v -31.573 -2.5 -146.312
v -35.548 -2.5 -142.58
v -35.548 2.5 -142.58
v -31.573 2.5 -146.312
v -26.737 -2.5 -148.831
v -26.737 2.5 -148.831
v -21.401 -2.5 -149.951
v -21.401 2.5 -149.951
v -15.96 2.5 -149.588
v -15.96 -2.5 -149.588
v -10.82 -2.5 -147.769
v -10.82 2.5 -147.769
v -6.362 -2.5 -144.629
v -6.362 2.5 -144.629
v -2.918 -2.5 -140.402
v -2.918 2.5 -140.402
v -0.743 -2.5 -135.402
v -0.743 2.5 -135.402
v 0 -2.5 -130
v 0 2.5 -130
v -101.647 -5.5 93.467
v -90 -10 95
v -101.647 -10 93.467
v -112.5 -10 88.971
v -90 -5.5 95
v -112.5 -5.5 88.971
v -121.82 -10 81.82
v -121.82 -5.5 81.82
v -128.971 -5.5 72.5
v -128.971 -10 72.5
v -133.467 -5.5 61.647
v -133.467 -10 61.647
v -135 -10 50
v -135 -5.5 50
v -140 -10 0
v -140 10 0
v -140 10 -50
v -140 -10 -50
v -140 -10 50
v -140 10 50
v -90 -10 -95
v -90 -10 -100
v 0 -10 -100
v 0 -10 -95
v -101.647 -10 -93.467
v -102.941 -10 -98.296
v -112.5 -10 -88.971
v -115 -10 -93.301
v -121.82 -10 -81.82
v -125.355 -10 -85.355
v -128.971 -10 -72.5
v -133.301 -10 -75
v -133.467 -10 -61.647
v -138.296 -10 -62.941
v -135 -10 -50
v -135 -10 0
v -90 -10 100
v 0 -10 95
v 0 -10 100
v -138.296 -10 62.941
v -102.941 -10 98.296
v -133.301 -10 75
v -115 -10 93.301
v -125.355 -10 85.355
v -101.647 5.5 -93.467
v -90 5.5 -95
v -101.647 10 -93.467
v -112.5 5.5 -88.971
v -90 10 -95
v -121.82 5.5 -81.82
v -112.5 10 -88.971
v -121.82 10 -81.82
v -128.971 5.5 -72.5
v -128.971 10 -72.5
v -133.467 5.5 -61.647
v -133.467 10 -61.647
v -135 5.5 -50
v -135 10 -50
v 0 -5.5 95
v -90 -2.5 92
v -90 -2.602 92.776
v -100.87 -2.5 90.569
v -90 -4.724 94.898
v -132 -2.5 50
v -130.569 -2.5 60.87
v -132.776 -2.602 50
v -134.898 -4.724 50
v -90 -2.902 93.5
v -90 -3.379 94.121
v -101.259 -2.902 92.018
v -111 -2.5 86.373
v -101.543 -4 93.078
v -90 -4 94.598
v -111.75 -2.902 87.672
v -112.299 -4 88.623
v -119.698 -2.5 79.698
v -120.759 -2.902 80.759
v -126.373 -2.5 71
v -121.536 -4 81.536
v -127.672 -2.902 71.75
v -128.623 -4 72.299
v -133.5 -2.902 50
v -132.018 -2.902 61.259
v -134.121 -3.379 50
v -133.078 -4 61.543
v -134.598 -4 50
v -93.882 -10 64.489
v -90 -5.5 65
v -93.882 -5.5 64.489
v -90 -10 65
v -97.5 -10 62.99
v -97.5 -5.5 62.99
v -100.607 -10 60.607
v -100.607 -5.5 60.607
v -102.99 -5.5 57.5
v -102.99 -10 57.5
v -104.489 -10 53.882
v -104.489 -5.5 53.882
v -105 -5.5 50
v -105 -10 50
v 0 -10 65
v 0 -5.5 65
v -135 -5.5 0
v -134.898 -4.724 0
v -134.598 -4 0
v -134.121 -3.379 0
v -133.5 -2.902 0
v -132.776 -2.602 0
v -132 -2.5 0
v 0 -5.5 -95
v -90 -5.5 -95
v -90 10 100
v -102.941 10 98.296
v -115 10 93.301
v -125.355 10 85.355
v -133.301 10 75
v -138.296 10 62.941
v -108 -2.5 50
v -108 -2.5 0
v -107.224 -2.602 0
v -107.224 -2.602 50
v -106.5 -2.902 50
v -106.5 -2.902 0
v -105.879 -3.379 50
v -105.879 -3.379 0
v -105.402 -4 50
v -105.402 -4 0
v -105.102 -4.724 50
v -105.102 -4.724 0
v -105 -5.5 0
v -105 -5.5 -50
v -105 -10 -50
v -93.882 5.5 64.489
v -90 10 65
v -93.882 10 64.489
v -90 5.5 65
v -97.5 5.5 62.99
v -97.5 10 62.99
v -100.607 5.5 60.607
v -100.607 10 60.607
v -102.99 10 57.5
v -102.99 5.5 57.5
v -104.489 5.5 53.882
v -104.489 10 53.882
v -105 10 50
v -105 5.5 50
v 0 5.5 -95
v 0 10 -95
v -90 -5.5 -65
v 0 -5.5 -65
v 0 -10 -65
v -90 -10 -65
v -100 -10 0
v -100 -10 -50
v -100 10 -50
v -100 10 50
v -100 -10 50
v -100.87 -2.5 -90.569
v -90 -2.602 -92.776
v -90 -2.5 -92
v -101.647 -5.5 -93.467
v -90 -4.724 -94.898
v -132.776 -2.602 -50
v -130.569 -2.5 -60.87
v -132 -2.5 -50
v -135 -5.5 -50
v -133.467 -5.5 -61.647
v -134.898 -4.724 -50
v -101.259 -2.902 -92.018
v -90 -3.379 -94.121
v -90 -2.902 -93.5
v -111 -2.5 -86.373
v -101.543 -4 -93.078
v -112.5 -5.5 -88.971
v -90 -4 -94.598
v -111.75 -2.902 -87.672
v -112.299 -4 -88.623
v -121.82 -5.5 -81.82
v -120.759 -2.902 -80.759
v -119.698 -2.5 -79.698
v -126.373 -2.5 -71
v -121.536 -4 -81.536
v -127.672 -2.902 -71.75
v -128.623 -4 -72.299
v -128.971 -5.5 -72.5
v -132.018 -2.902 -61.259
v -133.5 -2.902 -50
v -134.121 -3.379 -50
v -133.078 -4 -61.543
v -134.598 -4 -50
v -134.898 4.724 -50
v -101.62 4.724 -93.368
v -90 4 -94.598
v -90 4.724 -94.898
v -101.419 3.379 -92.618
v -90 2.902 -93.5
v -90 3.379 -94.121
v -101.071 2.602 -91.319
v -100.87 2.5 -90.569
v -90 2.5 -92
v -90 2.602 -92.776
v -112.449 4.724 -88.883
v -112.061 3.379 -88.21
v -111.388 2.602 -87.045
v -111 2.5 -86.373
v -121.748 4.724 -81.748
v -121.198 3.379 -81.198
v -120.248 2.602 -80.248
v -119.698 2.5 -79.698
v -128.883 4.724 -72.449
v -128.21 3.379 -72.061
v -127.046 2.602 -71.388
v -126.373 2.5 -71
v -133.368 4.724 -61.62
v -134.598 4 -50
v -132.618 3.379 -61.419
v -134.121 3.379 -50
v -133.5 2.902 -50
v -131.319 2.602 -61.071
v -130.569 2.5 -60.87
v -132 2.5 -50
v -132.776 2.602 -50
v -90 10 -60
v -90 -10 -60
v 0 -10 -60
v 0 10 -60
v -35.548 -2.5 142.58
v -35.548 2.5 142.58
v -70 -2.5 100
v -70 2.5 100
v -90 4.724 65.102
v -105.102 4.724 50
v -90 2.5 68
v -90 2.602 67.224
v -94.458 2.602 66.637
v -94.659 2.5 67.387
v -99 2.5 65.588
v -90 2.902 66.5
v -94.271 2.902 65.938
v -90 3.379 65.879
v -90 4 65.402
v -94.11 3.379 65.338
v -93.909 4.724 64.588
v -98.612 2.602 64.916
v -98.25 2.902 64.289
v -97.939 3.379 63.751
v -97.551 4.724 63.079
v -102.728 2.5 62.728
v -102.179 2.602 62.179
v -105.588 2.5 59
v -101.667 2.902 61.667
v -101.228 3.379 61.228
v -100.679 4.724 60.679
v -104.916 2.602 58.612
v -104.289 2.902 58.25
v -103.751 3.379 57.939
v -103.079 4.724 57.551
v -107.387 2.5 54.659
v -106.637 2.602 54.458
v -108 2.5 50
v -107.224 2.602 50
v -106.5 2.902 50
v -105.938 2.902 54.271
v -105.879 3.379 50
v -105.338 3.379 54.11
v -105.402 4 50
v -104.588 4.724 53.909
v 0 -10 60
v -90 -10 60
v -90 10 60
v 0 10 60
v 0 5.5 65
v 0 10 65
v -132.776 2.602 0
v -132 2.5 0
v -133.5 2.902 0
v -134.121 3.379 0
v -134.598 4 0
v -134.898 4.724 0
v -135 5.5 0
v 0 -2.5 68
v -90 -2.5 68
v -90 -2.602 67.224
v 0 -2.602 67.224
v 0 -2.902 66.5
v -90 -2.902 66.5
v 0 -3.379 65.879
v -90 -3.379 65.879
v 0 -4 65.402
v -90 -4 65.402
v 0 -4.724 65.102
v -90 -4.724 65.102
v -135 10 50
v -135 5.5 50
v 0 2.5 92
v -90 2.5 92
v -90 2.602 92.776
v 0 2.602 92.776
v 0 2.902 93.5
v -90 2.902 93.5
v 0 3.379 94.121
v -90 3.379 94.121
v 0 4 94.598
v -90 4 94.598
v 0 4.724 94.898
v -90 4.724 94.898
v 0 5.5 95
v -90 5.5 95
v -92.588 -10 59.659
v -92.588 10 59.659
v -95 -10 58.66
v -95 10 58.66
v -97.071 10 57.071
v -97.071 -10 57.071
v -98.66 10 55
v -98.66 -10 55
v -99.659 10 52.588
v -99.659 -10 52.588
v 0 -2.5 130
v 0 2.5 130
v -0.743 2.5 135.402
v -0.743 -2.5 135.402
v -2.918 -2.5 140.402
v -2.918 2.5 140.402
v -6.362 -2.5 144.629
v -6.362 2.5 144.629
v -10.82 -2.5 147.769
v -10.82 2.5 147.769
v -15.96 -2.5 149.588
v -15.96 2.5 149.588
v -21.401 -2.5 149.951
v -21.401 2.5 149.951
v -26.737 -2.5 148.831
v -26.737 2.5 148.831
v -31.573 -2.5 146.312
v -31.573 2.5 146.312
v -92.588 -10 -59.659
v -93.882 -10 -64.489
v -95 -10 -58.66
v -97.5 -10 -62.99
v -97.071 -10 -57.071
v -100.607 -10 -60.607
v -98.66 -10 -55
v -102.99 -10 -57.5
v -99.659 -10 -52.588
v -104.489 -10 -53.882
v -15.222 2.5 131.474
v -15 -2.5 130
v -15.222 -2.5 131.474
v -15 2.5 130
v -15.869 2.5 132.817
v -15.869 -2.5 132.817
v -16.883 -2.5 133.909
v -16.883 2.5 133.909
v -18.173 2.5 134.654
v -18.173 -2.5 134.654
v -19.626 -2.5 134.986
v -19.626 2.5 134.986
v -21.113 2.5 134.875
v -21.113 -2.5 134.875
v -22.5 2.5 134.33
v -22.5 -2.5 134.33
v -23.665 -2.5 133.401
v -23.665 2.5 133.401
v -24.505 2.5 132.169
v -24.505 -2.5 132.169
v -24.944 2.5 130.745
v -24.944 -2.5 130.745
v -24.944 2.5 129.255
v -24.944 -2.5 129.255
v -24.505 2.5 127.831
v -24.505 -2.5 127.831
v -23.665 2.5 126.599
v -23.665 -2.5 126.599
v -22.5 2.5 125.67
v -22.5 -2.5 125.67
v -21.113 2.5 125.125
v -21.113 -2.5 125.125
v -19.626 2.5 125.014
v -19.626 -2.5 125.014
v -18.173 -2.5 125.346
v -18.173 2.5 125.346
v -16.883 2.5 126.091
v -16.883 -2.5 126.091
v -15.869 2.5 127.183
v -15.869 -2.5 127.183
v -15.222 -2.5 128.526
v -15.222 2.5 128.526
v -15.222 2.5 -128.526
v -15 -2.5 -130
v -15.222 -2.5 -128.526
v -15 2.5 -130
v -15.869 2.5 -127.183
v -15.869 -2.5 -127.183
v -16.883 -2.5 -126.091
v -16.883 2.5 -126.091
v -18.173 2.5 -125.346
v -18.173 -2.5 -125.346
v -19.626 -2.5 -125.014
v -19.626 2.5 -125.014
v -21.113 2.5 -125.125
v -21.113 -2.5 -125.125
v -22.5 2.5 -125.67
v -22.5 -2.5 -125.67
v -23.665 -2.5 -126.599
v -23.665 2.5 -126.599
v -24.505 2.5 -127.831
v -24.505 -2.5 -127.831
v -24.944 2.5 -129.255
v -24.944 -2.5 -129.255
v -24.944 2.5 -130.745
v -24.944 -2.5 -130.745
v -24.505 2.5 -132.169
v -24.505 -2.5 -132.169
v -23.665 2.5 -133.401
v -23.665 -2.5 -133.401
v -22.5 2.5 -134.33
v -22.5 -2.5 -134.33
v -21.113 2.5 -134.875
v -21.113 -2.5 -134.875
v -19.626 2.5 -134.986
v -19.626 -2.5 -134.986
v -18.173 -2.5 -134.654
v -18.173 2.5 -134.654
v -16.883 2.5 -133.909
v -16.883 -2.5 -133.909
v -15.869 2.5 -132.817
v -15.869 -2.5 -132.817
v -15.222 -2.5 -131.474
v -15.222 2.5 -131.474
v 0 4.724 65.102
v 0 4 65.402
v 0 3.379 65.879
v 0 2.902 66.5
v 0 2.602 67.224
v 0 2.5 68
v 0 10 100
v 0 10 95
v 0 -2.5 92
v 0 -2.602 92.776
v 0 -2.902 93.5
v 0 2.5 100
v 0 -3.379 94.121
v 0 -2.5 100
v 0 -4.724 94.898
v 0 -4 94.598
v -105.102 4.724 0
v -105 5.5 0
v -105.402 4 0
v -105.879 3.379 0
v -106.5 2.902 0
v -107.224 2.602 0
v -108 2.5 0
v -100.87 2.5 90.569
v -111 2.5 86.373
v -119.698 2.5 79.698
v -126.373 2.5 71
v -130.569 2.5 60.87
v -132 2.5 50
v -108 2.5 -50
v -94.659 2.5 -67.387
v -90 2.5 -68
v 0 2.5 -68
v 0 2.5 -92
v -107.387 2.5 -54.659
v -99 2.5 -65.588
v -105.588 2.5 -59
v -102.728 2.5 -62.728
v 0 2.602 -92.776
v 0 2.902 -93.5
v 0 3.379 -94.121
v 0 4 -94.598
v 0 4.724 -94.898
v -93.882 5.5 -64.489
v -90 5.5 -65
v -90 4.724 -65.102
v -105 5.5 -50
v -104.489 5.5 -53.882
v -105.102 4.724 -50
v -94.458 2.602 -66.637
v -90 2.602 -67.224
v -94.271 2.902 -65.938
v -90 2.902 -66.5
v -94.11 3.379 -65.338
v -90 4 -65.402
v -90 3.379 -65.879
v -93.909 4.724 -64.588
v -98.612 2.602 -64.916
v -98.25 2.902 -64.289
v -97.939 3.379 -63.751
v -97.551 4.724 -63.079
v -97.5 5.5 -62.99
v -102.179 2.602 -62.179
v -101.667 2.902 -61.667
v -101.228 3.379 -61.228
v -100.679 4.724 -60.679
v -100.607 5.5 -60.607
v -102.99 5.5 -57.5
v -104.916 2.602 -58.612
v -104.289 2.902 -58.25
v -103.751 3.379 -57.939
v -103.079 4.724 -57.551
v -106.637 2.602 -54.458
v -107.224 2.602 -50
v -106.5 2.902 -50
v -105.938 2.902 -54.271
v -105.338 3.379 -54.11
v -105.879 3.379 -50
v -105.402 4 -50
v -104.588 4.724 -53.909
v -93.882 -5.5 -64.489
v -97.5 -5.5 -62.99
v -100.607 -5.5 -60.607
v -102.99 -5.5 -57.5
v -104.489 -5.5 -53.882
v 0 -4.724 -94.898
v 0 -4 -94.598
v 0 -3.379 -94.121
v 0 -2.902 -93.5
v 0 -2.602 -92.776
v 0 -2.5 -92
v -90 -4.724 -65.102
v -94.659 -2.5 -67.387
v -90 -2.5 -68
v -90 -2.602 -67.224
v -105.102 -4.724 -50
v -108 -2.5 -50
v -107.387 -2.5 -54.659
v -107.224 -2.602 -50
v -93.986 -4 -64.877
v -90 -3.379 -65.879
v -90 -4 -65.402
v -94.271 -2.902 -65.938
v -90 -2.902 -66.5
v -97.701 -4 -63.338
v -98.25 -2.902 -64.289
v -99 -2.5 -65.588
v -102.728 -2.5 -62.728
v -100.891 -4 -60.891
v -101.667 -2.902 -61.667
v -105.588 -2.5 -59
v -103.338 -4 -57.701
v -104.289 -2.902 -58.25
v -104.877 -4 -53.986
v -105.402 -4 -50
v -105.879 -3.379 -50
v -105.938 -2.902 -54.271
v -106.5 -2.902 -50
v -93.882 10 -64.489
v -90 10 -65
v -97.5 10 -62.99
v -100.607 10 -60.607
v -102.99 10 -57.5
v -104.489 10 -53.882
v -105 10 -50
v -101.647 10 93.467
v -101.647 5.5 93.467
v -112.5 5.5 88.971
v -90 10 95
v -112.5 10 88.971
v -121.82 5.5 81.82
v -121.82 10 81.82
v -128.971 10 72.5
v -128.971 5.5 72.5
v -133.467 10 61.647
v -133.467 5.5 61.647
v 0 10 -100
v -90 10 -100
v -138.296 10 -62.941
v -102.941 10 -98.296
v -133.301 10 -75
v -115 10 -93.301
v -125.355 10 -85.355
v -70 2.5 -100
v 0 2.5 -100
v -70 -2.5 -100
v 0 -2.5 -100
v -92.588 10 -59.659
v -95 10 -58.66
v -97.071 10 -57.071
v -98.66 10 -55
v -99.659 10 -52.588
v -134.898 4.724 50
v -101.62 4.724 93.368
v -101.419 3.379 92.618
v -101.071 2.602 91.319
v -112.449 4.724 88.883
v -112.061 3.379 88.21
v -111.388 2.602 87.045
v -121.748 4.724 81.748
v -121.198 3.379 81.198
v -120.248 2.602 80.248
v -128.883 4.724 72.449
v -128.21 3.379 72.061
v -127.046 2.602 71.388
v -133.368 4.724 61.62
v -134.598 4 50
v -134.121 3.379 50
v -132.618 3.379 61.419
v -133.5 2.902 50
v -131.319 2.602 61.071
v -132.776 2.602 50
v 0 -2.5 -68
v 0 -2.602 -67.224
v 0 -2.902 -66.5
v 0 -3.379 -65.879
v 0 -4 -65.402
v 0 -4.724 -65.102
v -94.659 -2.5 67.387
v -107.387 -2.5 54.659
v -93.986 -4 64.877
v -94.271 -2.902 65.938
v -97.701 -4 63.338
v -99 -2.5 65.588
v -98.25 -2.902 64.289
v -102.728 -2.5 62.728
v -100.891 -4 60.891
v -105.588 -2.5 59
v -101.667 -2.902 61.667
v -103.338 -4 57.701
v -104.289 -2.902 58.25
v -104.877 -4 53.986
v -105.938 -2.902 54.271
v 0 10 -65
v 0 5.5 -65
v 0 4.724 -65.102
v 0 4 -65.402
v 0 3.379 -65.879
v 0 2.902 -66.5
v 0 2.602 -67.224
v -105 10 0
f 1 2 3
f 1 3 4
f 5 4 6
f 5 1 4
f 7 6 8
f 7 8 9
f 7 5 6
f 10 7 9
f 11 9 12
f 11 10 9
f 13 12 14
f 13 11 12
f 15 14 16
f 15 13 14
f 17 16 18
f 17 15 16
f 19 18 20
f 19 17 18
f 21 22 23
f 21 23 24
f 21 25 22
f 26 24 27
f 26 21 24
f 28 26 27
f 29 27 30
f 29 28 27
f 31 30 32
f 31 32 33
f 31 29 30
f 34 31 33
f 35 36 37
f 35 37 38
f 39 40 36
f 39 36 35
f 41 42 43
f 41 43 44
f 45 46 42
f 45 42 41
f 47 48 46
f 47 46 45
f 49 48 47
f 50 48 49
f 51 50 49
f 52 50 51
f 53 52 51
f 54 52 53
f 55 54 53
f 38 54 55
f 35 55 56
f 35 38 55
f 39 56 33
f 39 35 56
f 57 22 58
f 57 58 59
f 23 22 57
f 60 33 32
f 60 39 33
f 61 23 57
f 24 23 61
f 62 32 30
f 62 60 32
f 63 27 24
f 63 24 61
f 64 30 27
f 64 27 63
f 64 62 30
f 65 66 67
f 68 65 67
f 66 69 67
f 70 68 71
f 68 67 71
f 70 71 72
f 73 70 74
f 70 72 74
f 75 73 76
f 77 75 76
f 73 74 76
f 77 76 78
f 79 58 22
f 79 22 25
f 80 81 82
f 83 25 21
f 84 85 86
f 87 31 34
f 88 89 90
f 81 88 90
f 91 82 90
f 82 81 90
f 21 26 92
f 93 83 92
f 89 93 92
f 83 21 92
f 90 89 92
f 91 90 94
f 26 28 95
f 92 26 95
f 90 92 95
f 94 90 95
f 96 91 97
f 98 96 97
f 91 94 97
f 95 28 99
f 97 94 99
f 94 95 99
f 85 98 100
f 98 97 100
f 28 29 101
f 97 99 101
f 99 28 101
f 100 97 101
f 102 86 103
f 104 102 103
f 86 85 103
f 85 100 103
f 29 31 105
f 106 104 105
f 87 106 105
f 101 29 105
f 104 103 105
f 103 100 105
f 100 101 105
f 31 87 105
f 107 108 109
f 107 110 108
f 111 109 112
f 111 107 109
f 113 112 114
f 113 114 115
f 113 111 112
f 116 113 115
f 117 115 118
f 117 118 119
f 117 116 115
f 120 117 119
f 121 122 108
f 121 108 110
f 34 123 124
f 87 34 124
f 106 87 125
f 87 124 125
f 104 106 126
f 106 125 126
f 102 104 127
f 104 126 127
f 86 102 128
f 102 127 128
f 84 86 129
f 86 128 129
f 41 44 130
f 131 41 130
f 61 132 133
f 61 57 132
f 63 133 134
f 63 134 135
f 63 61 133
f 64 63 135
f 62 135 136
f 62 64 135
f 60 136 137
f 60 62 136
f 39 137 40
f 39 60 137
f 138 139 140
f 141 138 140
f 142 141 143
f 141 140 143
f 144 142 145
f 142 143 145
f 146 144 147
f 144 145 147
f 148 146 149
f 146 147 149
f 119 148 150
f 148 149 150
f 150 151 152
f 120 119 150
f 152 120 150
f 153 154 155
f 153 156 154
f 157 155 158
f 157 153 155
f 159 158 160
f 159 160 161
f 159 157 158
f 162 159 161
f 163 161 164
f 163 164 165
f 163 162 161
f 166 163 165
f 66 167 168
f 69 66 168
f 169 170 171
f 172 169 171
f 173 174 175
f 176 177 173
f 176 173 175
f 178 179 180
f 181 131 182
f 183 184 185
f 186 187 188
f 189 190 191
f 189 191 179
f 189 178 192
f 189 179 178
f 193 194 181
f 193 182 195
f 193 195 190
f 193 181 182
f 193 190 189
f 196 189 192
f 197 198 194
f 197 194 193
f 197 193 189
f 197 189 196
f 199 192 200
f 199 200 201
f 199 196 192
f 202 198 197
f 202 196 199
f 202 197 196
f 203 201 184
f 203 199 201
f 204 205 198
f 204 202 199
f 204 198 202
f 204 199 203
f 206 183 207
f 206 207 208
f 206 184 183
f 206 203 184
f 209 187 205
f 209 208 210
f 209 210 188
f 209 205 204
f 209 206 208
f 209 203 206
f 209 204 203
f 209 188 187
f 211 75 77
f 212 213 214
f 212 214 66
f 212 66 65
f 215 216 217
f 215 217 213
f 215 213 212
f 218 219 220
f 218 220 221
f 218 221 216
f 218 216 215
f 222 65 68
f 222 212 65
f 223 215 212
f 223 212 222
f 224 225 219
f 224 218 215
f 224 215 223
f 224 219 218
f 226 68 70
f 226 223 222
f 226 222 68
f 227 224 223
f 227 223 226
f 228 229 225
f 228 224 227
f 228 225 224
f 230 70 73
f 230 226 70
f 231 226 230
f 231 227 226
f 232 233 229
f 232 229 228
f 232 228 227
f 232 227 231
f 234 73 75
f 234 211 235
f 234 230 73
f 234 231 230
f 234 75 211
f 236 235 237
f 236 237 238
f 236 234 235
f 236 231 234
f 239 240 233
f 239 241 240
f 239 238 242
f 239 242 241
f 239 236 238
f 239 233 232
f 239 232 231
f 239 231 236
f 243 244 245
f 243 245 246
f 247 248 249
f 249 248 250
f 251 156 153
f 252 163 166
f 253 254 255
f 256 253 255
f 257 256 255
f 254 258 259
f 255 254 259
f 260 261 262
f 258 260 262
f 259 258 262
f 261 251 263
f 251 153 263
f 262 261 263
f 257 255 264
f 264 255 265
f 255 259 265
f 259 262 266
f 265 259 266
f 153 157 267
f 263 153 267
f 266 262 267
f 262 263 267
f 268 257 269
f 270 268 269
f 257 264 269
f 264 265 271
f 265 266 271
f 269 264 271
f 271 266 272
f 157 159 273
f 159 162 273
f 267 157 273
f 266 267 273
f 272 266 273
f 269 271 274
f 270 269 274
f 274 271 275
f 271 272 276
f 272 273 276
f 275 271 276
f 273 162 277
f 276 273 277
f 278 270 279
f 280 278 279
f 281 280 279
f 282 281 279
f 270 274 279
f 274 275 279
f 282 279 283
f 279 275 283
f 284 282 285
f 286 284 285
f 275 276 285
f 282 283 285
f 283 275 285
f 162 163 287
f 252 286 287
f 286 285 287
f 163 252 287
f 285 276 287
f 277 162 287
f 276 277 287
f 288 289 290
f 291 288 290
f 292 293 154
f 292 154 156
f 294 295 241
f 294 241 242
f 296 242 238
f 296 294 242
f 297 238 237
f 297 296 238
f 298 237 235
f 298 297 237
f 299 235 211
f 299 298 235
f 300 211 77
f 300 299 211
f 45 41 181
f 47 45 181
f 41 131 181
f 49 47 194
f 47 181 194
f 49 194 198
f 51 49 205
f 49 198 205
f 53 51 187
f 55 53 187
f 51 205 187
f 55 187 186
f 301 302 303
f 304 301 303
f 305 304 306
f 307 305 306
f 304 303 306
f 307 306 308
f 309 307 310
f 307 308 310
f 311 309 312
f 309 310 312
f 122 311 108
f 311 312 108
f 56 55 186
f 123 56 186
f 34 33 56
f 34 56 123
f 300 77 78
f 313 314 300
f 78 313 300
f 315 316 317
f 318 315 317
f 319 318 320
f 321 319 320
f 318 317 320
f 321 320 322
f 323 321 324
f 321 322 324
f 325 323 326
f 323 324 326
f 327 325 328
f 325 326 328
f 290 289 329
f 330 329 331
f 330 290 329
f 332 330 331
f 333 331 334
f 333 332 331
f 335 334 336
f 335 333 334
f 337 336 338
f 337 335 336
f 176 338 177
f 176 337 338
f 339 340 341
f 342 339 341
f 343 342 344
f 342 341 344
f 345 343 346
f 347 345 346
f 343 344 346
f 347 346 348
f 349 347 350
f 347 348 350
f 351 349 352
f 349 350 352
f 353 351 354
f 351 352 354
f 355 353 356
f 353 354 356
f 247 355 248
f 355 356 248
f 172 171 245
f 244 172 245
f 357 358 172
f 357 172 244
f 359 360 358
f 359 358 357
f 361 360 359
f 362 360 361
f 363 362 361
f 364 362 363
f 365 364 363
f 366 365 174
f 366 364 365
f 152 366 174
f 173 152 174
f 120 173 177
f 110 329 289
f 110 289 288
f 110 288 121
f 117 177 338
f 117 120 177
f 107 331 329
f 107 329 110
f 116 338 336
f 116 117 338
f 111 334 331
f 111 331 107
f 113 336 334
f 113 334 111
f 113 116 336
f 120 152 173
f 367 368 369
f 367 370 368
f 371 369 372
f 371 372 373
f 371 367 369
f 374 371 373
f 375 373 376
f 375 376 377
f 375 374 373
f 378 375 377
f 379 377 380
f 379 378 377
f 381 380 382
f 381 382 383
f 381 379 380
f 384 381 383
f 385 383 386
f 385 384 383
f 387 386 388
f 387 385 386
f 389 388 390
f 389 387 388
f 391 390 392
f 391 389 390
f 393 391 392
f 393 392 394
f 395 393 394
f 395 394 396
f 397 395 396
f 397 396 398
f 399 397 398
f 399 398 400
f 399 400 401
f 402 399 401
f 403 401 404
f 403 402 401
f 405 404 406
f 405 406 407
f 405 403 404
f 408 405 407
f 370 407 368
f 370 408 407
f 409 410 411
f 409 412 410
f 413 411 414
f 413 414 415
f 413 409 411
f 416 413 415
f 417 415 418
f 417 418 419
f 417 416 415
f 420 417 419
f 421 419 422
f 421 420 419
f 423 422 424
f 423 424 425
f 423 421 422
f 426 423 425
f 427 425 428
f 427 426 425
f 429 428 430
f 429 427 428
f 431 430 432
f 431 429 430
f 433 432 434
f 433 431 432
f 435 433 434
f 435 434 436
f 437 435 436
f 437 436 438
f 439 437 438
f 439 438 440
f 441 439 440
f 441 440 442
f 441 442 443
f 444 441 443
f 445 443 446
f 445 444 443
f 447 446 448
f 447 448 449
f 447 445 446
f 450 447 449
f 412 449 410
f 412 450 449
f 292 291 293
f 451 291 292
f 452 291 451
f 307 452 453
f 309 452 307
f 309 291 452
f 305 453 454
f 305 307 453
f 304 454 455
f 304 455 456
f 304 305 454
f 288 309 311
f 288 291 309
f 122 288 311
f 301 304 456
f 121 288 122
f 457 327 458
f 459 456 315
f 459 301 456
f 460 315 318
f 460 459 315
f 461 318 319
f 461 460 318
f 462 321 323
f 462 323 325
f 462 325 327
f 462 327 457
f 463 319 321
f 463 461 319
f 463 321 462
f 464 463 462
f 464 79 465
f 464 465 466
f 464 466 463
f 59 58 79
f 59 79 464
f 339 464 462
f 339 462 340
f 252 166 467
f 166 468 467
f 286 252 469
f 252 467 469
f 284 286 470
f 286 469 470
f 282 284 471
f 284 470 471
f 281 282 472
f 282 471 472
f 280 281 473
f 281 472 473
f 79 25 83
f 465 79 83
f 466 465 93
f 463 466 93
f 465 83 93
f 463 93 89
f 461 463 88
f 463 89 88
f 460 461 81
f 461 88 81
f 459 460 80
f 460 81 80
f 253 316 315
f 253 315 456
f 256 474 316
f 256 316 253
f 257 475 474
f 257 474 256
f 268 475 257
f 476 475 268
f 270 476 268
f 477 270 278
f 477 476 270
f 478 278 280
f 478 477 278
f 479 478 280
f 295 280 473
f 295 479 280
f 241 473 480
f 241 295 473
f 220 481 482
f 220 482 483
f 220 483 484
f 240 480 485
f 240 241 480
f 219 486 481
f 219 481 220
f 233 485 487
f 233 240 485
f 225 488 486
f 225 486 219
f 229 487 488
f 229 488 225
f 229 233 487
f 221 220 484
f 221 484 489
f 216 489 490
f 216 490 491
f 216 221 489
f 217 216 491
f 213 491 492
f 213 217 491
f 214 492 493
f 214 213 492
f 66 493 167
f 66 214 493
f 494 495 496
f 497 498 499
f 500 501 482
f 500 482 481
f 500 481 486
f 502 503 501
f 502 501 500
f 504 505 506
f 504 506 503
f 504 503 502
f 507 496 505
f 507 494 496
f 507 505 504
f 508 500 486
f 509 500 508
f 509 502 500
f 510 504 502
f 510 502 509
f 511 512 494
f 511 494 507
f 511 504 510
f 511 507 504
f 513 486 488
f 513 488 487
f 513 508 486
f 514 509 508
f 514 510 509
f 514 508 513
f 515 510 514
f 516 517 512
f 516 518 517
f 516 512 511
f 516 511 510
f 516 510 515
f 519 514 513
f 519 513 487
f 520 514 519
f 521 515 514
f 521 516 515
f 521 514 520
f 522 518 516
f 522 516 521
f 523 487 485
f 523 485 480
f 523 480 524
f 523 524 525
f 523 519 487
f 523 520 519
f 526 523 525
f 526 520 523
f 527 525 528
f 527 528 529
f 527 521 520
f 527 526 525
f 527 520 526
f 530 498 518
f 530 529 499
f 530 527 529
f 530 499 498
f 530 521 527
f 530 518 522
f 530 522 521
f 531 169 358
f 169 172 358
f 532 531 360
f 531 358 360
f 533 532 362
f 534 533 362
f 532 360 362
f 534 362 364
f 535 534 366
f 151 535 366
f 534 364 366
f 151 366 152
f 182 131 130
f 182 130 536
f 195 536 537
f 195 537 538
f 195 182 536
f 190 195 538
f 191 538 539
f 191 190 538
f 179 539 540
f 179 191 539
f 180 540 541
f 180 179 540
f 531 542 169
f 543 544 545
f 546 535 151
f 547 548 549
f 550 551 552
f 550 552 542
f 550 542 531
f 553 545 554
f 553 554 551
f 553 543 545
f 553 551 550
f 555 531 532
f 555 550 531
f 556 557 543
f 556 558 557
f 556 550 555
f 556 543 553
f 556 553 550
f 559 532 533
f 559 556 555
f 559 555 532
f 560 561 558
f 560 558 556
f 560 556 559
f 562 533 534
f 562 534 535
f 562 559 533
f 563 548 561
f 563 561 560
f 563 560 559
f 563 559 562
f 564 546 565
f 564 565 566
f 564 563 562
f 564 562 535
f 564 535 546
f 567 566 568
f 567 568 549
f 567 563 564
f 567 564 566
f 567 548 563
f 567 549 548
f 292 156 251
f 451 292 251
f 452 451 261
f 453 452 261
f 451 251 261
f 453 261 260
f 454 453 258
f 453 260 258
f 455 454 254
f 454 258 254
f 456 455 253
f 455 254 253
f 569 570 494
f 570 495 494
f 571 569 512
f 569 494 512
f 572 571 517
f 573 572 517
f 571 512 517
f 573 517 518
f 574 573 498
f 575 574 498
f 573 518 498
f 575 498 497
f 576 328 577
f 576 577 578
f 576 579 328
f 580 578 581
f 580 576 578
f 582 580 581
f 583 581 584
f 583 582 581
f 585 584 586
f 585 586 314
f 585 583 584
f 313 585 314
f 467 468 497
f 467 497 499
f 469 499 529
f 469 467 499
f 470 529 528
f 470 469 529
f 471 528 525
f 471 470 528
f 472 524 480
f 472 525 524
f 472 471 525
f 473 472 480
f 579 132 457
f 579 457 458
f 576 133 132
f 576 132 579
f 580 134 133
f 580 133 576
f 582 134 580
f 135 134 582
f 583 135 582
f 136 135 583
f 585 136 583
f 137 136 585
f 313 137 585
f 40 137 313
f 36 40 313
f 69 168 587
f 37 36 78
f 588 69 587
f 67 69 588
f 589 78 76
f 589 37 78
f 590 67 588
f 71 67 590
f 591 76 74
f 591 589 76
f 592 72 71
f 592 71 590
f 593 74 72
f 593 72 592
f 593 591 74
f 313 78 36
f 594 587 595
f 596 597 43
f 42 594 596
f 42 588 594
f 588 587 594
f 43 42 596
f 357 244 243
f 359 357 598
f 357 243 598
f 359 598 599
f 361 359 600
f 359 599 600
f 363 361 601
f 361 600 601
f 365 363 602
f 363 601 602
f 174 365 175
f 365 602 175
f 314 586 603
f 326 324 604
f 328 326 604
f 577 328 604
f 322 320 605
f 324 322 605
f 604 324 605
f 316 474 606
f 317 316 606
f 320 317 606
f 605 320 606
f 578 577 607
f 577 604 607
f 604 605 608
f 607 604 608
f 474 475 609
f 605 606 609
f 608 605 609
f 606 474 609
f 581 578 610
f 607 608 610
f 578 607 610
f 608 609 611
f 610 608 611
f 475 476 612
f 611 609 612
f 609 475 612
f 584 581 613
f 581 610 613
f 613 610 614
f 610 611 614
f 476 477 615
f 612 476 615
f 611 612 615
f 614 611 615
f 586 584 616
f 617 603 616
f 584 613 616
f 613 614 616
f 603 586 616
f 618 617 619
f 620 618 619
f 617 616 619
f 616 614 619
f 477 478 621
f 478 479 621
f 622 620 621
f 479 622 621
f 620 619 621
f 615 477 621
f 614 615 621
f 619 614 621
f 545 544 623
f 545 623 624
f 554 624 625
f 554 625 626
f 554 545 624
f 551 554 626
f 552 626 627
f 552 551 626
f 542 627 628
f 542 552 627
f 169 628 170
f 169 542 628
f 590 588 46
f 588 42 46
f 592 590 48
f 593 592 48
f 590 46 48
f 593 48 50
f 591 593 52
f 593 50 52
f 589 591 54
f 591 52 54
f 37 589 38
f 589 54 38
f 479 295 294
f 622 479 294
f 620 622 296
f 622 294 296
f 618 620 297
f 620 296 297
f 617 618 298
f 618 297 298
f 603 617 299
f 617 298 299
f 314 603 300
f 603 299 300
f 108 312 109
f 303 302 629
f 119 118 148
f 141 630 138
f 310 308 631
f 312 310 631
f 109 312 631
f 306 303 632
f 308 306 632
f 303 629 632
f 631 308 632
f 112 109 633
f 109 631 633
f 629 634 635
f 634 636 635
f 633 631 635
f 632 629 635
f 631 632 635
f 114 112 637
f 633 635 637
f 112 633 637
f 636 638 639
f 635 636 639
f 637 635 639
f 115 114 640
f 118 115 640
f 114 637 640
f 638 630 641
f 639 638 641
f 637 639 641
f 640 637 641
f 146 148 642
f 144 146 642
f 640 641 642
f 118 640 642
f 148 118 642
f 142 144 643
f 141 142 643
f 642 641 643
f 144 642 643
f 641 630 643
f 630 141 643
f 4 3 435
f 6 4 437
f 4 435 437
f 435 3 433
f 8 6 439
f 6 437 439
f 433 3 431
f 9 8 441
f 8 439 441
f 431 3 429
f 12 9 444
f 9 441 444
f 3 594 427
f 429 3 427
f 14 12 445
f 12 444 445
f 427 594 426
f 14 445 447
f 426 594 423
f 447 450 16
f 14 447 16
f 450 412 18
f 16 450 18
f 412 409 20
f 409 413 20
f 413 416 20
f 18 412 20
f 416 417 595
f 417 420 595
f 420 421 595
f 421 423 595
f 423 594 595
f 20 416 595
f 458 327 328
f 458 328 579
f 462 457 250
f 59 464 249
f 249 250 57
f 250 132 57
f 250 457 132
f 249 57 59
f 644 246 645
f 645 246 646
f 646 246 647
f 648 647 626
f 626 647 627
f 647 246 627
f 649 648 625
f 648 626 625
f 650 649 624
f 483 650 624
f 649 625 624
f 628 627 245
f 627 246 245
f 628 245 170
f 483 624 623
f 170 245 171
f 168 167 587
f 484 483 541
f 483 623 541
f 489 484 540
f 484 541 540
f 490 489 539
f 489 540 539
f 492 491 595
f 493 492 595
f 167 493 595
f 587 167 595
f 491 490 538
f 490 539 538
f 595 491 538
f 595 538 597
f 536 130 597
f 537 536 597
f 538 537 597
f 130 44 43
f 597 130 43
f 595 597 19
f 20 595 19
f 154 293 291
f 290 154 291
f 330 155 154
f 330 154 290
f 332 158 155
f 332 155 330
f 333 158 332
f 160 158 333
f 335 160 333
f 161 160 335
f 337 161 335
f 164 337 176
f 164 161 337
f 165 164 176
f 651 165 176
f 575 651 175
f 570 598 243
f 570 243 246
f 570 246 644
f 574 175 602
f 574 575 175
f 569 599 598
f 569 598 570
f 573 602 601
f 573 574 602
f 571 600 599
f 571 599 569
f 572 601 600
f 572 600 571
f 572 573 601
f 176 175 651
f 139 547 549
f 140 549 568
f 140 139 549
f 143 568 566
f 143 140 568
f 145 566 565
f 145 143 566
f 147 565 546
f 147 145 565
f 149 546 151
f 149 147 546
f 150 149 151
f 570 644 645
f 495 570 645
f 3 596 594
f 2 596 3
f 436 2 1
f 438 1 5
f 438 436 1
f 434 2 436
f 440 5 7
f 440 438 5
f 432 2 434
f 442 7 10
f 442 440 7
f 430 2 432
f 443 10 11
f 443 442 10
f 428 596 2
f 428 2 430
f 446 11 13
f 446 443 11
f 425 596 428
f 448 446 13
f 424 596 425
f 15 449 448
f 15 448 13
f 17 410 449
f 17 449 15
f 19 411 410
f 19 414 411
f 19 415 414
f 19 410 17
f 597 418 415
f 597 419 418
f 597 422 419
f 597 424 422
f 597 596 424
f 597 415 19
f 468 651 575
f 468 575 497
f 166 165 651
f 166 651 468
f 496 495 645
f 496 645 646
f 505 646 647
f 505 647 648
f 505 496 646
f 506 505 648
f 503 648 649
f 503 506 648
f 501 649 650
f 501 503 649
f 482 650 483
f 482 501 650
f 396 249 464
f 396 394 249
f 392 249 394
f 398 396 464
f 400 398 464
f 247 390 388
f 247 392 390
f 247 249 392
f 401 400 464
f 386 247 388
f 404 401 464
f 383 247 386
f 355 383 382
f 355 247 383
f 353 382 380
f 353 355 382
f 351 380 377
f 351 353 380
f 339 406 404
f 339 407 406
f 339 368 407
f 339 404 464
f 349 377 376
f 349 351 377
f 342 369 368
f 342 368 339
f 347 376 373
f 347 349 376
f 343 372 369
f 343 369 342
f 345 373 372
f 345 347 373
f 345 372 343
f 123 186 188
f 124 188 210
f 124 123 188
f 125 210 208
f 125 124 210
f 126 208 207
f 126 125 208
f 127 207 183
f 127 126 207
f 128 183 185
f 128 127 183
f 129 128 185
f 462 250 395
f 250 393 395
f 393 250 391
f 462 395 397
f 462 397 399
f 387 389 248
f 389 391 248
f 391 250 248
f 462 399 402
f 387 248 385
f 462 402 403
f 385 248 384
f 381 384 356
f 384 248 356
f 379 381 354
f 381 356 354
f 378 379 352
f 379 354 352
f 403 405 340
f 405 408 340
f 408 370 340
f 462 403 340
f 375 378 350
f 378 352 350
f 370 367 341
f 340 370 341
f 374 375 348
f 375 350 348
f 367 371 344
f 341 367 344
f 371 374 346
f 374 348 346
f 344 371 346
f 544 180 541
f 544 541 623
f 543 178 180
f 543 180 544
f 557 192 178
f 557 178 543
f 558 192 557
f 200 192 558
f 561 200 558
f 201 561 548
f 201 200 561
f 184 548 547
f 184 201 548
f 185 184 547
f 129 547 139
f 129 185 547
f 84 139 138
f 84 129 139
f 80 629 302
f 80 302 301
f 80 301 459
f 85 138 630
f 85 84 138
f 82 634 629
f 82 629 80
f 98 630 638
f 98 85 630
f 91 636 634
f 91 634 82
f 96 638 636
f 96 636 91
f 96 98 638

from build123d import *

# Parameters (mm, degrees)
F4_R     = 5
F5_DEPTH = 2.5


with BuildPart() as f2:
    # F2: sweep along a path in F0
    with BuildLine(Plane.XZ) as f2_path:
        Line((0, 60), (-90, 60))
        ThreePointArc((-90, 60), (-97.071068, 57.071068), (-100, 50))
        Line((-100, 50), (-100, 0))
    # F1 (on Right) → F2 (sweep)
    with BuildSketch(Plane.YZ):
        with BuildLine():
            Line((-10, 100), (-10, 95))
            Line((-10, 95), (-5.5, 95))
            ThreePointArc((-5.5, 95), (-3.37868, 94.12132), (-2.5, 92))
            Line((-2.5, 92), (-2.5, 68))
            ThreePointArc((-2.5, 68), (-3.37868, 65.87868), (-5.5, 65))
            Line((-5.5, 65), (-10, 65))
            Line((-10, 65), (-10, 60))
            Line((-10, 60), (0, 60))
            Line((0, 60), (10, 60))
            Line((10, 60), (10, 65))
            Line((10, 65), (5.5, 65))
            ThreePointArc((5.5, 65), (3.37868, 65.87868), (2.5, 68))
            Line((2.5, 68), (2.5, 92))
            ThreePointArc((2.5, 92), (3.37868, 94.12132), (5.5, 95))
            Line((5.5, 95), (10, 95))
            Line((10, 95), (10, 100))
            Line((10, 100), (-10, 100))
        make_face()
    sweep(path=f2_path.line)

    # F3: F2 across plane


with BuildPart() as f2_1:
    add(f2.part)
    add(f2.part.mirror(Plane.XY))

    # F4 (on Front) → F5 (join, symmetric)
    with BuildSketch(Plane.XZ):
        with BuildLine():
            Line((-35.548045, 142.580075), (-70, 100))
            Line((-70, 100), (0, 100))
            Line((0, 100), (0, 130))
            ThreePointArc((0, 130), (-13.327703, 148.854189), (-35.548045, 142.580075))
        make_face()
        with Locations((-20, 130)):
            Circle(F4_R, mode=Mode.SUBTRACT)
        with BuildLine():
            Line((0, -100), (-70, -100))
            Line((-70, -100), (-35.548045, -142.580075))
            ThreePointArc((-35.548045, -142.580075), (-13.327703, -148.854189), (0, -130))
            Line((0, -130), (0, -100))
        make_face()
        with Locations((-20, -130)):
            Circle(F4_R, mode=Mode.SUBTRACT)
    extrude(amount=F5_DEPTH, both=True)


solid = f2_1.part
